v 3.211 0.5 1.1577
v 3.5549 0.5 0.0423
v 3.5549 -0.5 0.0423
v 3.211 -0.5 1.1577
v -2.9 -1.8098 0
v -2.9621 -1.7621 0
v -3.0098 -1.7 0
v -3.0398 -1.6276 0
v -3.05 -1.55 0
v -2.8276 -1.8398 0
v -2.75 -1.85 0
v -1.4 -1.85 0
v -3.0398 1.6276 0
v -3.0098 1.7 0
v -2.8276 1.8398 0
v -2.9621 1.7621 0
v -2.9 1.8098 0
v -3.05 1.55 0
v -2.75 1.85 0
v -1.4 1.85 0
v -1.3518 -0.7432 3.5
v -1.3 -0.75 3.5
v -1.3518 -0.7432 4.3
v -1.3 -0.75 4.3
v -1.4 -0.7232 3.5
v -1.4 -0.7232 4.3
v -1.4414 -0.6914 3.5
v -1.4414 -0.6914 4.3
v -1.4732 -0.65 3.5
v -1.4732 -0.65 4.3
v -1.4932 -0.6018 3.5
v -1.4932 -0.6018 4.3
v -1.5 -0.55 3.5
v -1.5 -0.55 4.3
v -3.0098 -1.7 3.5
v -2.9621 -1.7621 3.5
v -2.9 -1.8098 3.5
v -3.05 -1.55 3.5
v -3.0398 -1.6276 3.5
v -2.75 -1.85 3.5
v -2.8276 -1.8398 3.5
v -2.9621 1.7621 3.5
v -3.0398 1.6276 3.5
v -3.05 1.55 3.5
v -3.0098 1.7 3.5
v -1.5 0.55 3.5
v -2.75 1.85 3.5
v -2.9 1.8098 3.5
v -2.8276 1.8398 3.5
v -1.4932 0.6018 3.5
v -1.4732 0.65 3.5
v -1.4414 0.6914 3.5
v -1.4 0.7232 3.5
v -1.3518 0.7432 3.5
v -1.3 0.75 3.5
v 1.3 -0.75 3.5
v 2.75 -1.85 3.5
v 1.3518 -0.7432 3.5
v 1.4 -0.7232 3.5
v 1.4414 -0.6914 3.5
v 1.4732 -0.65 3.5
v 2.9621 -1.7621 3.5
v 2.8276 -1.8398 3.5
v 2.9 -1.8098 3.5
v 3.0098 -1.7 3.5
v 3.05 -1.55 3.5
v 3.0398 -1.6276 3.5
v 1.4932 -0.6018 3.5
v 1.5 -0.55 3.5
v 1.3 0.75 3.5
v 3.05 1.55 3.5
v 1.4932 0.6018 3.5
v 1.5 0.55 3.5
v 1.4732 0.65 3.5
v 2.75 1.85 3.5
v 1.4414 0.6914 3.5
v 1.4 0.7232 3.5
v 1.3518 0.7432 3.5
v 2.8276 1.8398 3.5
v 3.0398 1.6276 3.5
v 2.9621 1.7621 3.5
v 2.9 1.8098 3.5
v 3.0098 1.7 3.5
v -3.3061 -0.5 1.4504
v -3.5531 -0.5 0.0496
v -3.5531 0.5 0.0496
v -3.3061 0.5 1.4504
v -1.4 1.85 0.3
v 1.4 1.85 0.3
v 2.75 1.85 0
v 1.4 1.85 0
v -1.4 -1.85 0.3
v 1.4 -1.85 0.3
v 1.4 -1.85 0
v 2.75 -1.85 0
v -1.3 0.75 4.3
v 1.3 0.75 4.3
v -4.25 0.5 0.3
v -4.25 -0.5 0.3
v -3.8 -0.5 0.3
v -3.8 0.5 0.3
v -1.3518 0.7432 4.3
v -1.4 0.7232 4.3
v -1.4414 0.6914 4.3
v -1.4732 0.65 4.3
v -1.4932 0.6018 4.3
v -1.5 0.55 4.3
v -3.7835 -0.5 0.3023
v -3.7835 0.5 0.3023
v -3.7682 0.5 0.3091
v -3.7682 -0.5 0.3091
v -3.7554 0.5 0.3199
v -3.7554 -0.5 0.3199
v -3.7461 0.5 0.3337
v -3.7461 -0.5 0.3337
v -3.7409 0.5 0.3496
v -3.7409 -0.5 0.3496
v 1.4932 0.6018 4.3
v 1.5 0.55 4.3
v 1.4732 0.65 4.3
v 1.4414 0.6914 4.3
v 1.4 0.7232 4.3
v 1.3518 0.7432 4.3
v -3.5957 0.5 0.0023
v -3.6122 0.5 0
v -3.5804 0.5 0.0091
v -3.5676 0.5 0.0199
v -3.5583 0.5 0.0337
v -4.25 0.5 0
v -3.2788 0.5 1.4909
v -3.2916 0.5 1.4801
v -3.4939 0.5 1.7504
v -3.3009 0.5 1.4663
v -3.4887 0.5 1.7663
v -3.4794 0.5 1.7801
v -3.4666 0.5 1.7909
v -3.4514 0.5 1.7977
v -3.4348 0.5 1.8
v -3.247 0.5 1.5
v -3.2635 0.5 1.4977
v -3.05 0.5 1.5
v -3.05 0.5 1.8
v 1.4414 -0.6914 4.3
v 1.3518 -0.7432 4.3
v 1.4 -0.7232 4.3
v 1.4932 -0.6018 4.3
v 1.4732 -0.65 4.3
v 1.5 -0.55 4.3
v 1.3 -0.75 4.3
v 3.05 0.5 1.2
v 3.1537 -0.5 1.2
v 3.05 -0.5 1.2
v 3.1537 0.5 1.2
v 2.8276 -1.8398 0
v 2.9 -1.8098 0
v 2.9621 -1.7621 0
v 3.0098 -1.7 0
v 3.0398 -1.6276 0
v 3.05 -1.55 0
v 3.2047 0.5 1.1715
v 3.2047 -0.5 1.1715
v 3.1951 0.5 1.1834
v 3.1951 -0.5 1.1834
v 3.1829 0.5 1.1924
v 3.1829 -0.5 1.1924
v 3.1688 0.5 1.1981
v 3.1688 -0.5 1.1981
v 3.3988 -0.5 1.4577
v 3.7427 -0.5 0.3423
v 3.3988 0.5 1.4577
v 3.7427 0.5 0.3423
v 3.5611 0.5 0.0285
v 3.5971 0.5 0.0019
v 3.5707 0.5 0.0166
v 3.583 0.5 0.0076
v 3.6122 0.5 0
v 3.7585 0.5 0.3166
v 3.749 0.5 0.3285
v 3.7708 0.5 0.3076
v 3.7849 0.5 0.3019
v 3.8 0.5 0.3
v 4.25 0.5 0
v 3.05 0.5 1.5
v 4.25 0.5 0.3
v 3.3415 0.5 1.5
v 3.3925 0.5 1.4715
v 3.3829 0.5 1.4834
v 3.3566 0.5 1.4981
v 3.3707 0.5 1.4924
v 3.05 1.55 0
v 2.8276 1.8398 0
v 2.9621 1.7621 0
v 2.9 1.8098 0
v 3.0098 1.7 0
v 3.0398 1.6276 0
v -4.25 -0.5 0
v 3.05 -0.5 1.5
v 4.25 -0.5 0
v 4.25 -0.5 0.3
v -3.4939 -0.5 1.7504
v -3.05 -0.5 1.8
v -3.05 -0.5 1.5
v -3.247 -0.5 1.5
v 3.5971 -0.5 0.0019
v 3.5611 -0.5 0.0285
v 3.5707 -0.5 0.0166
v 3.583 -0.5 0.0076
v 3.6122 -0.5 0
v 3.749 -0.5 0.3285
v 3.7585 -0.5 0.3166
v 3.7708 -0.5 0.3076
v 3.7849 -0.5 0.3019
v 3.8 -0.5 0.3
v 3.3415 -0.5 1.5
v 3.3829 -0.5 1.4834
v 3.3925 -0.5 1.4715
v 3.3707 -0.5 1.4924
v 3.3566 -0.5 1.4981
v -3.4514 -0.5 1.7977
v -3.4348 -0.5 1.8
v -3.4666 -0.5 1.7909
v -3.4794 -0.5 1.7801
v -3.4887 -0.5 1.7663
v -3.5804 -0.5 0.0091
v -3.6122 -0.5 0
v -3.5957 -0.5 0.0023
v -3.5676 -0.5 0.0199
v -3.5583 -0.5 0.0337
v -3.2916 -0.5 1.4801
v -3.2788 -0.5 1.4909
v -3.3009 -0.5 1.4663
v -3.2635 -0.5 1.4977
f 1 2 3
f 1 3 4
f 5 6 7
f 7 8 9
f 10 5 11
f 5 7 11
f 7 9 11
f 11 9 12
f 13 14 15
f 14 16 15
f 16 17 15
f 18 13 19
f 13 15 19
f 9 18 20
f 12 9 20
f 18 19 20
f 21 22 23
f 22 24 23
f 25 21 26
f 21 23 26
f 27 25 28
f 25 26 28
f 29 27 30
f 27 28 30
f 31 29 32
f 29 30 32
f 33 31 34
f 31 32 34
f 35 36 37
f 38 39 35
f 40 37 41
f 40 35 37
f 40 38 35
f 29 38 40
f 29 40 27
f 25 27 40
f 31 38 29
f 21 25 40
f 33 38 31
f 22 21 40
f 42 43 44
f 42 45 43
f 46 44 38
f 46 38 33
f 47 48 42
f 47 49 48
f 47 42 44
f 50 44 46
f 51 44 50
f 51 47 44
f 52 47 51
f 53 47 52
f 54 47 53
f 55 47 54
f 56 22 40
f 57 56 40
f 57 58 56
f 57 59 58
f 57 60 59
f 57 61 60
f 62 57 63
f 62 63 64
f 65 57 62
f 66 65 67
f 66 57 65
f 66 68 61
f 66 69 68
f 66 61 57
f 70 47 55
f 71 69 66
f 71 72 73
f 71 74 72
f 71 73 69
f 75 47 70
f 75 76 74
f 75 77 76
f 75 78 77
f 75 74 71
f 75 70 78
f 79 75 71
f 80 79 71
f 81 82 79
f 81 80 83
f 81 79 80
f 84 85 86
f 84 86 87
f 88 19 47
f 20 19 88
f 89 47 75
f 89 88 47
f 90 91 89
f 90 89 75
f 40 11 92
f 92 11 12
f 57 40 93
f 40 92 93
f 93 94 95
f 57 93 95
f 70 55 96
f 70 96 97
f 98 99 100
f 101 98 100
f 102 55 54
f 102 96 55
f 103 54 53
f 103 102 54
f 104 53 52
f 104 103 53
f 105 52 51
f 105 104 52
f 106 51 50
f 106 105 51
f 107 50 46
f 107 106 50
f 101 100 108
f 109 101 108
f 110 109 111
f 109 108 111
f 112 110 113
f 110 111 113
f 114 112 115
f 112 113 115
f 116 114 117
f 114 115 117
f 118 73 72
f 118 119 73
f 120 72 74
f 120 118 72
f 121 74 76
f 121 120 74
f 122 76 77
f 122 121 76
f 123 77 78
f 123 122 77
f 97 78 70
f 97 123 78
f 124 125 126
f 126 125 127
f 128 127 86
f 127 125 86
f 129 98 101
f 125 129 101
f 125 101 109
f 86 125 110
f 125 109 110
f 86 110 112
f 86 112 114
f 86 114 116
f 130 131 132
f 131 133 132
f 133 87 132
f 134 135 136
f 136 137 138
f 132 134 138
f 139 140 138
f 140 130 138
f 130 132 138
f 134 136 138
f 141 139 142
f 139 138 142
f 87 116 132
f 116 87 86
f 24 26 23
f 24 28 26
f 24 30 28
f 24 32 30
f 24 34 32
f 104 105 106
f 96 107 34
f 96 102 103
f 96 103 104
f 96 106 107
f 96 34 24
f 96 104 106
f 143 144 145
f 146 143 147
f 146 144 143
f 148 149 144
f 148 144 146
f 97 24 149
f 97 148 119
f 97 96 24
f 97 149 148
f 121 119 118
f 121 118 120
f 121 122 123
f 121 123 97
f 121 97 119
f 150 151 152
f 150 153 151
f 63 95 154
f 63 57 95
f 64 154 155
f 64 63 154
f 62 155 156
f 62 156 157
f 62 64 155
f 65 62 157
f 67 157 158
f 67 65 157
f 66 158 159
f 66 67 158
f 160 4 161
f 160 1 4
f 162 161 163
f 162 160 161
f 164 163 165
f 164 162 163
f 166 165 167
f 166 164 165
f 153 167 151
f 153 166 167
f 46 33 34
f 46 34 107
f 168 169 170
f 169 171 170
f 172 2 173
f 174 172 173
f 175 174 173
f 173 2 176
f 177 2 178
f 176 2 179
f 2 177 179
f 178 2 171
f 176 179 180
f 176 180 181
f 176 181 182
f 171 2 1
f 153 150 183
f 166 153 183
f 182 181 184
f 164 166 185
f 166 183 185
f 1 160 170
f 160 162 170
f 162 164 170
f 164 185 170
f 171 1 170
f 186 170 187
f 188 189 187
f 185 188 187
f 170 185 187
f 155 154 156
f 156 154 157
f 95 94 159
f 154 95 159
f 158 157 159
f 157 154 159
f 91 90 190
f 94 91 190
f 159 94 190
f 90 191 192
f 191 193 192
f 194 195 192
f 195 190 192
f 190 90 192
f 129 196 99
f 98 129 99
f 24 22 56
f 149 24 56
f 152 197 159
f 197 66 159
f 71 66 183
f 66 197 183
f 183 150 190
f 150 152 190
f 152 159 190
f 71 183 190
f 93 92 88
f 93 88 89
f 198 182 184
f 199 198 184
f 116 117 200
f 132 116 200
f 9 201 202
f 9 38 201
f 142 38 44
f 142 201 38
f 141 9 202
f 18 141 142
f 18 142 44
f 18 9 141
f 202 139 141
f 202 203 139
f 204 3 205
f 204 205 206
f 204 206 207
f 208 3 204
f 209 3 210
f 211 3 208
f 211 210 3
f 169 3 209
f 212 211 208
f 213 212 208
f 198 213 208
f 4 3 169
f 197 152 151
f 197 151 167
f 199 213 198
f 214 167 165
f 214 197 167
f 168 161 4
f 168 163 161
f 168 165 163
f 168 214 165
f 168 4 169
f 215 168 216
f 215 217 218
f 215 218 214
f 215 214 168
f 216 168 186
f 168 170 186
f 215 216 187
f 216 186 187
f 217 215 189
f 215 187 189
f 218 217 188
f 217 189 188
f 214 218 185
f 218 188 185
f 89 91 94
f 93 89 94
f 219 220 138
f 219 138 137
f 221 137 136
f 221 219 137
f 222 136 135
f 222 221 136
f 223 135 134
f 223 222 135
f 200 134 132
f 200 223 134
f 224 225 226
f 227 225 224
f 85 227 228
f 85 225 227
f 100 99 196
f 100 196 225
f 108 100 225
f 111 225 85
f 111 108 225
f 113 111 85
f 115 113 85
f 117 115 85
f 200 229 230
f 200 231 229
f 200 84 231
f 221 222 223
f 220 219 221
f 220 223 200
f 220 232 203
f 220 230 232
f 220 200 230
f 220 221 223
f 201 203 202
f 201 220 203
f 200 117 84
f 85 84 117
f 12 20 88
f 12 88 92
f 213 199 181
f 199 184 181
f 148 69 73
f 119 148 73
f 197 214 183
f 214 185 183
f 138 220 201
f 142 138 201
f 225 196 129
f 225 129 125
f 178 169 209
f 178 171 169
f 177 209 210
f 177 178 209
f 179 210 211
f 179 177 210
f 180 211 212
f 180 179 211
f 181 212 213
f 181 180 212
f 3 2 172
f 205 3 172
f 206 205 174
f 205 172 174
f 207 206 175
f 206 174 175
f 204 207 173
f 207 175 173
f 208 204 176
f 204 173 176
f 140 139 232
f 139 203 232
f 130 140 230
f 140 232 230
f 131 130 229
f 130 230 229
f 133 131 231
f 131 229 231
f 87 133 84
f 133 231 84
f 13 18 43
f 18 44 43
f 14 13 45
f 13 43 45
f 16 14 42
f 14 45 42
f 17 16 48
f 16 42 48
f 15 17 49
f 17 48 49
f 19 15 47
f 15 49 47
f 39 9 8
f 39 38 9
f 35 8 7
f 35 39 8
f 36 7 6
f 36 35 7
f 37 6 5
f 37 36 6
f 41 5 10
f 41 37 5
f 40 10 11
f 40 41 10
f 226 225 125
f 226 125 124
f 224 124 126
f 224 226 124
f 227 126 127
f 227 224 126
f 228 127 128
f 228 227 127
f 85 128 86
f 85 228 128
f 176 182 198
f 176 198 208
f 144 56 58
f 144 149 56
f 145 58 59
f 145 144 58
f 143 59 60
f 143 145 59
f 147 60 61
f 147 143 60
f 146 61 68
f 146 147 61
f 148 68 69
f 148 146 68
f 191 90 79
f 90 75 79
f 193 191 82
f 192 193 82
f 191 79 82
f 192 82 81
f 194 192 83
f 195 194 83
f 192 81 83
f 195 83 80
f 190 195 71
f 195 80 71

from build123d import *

# Parameters (mm, degrees)
SKETCH001_W  = 6.1
SKETCH001_H  = 3.7
PAD001_DEPTH = 3.5
SKETCH002_W  = 2.8
SKETCH002_H  = 3.7
POCKET_DEPTH = 0.3
FILLET_R     = 0.3
SKETCH003_W  = 3
SKETCH003_H  = 1.5
PAD002_DEPTH = 0.8
FILLET001_R  = 0.2
PAD_DEPTH    = 0.5


with BuildPart() as przycisk_zaokraglony:
    # Sketch001 → Pad001 (new body)
    with BuildSketch(Plane.XY):
        Rectangle(SKETCH001_W, SKETCH001_H)
    extrude(amount=PAD001_DEPTH)

    # Sketch002 → Pocket (cut)
    with BuildSketch(Plane(origin=(0, 0, 0), x_dir=(1, 0, 0), z_dir=(0, 0, -1))):
        Rectangle(SKETCH002_W, SKETCH002_H)
    extrude(amount=-POCKET_DEPTH, mode=Mode.SUBTRACT)

    # Fillet
    fillet_edges = [przycisk_zaokraglony.edges().sort_by_distance(p)[0] for p in [
        (-3.05, -1.85, 1.75),
        (-3.05, 1.85, 1.75),
        (3.05, -1.85, 1.75),
        (3.05, 1.85, 1.75),
    ]]
    fillet(fillet_edges, radius=FILLET_R)

    # Sketch003 → Pad002 (new body)
    with BuildSketch(Plane.XY.offset(3.5)):
        Rectangle(SKETCH003_W, SKETCH003_H)
    extrude(amount=PAD002_DEPTH)

    # Fillet001
    fillet001_edges = [przycisk_zaokraglony.edges().sort_by_distance(p)[0] for p in [
        (1.5, -0.75, 3.9),
        (1.5, 0.75, 3.9),
        (-1.5, 0.75, 3.9),
        (-1.5, -0.75, 3.9),
    ]]
    fillet(fillet001_edges, radius=FILLET001_R)


with BuildPart() as fusion:
    # Sketch → Pad (new body, symmetric)
    with BuildSketch(Plane.XZ):
        with BuildLine():
            Line((4.25, 0), (4.25, 0.3))
            Line((4.25, 0.3), (3.8, 0.3))
            ThreePointArc((3.742663, 0.342323), (3.764367, 0.311727), (3.8, 0.3))
            Line((3.742663, 0.342323), (3.398806, 1.457677))
            ThreePointArc((3.398806, 1.457677), (3.377102, 1.488273), (3.341469, 1.5))
            Line((3.341469, 1.5), (3.05, 1.5))
            Line((3.05, 1.5), (3.05, 1.2))
            Line((3.153657, 1.2), (3.05, 1.2))
            ThreePointArc((3.210994, 1.157677), (3.18929, 1.188273), (3.153657, 1.2))
            Line((3.554852, 0.042323), (3.210994, 1.157677))
            ThreePointArc((3.554852, 0.042323), (3.576556, 0.011727), (3.612189, 0))
            Line((4.25, 0), (3.612189, 0))
        make_face()
        with BuildLine():
            Line((-3.05, 1.5), (-3.05, 1.8))
            Line((-3.434818, 1.8), (-3.05, 1.8))
            ThreePointArc((-3.434818, 1.8), (-3.473385, 1.785963), (-3.493906, 1.750419))
            Line((-3.740912, 0.349581), (-3.493906, 1.750419))
            ThreePointArc((-3.8, 0.3), (-3.761433, 0.314037), (-3.740912, 0.349581))
            Line((-4.25, 0.3), (-3.8, 0.3))
            Line((-4.25, 0), (-4.25, 0.3))
            Line((-4.25, 0), (-3.612189, 0))
            ThreePointArc((-3.612189, 0), (-3.573621, 0.014037), (-3.5531, 0.049581))
            Line((-3.5531, 0.049581), (-3.306095, 1.450419))
            ThreePointArc((-3.247006, 1.5), (-3.285573, 1.485963), (-3.306095, 1.450419))
            Line((-3.247006, 1.5), (-3.05, 1.5))
        make_face()
    extrude(amount=PAD_DEPTH, both=True)

    # Fusion: union przycisk_zaokraglony
    add(przycisk_zaokraglony.part)


solid = fusion.part
